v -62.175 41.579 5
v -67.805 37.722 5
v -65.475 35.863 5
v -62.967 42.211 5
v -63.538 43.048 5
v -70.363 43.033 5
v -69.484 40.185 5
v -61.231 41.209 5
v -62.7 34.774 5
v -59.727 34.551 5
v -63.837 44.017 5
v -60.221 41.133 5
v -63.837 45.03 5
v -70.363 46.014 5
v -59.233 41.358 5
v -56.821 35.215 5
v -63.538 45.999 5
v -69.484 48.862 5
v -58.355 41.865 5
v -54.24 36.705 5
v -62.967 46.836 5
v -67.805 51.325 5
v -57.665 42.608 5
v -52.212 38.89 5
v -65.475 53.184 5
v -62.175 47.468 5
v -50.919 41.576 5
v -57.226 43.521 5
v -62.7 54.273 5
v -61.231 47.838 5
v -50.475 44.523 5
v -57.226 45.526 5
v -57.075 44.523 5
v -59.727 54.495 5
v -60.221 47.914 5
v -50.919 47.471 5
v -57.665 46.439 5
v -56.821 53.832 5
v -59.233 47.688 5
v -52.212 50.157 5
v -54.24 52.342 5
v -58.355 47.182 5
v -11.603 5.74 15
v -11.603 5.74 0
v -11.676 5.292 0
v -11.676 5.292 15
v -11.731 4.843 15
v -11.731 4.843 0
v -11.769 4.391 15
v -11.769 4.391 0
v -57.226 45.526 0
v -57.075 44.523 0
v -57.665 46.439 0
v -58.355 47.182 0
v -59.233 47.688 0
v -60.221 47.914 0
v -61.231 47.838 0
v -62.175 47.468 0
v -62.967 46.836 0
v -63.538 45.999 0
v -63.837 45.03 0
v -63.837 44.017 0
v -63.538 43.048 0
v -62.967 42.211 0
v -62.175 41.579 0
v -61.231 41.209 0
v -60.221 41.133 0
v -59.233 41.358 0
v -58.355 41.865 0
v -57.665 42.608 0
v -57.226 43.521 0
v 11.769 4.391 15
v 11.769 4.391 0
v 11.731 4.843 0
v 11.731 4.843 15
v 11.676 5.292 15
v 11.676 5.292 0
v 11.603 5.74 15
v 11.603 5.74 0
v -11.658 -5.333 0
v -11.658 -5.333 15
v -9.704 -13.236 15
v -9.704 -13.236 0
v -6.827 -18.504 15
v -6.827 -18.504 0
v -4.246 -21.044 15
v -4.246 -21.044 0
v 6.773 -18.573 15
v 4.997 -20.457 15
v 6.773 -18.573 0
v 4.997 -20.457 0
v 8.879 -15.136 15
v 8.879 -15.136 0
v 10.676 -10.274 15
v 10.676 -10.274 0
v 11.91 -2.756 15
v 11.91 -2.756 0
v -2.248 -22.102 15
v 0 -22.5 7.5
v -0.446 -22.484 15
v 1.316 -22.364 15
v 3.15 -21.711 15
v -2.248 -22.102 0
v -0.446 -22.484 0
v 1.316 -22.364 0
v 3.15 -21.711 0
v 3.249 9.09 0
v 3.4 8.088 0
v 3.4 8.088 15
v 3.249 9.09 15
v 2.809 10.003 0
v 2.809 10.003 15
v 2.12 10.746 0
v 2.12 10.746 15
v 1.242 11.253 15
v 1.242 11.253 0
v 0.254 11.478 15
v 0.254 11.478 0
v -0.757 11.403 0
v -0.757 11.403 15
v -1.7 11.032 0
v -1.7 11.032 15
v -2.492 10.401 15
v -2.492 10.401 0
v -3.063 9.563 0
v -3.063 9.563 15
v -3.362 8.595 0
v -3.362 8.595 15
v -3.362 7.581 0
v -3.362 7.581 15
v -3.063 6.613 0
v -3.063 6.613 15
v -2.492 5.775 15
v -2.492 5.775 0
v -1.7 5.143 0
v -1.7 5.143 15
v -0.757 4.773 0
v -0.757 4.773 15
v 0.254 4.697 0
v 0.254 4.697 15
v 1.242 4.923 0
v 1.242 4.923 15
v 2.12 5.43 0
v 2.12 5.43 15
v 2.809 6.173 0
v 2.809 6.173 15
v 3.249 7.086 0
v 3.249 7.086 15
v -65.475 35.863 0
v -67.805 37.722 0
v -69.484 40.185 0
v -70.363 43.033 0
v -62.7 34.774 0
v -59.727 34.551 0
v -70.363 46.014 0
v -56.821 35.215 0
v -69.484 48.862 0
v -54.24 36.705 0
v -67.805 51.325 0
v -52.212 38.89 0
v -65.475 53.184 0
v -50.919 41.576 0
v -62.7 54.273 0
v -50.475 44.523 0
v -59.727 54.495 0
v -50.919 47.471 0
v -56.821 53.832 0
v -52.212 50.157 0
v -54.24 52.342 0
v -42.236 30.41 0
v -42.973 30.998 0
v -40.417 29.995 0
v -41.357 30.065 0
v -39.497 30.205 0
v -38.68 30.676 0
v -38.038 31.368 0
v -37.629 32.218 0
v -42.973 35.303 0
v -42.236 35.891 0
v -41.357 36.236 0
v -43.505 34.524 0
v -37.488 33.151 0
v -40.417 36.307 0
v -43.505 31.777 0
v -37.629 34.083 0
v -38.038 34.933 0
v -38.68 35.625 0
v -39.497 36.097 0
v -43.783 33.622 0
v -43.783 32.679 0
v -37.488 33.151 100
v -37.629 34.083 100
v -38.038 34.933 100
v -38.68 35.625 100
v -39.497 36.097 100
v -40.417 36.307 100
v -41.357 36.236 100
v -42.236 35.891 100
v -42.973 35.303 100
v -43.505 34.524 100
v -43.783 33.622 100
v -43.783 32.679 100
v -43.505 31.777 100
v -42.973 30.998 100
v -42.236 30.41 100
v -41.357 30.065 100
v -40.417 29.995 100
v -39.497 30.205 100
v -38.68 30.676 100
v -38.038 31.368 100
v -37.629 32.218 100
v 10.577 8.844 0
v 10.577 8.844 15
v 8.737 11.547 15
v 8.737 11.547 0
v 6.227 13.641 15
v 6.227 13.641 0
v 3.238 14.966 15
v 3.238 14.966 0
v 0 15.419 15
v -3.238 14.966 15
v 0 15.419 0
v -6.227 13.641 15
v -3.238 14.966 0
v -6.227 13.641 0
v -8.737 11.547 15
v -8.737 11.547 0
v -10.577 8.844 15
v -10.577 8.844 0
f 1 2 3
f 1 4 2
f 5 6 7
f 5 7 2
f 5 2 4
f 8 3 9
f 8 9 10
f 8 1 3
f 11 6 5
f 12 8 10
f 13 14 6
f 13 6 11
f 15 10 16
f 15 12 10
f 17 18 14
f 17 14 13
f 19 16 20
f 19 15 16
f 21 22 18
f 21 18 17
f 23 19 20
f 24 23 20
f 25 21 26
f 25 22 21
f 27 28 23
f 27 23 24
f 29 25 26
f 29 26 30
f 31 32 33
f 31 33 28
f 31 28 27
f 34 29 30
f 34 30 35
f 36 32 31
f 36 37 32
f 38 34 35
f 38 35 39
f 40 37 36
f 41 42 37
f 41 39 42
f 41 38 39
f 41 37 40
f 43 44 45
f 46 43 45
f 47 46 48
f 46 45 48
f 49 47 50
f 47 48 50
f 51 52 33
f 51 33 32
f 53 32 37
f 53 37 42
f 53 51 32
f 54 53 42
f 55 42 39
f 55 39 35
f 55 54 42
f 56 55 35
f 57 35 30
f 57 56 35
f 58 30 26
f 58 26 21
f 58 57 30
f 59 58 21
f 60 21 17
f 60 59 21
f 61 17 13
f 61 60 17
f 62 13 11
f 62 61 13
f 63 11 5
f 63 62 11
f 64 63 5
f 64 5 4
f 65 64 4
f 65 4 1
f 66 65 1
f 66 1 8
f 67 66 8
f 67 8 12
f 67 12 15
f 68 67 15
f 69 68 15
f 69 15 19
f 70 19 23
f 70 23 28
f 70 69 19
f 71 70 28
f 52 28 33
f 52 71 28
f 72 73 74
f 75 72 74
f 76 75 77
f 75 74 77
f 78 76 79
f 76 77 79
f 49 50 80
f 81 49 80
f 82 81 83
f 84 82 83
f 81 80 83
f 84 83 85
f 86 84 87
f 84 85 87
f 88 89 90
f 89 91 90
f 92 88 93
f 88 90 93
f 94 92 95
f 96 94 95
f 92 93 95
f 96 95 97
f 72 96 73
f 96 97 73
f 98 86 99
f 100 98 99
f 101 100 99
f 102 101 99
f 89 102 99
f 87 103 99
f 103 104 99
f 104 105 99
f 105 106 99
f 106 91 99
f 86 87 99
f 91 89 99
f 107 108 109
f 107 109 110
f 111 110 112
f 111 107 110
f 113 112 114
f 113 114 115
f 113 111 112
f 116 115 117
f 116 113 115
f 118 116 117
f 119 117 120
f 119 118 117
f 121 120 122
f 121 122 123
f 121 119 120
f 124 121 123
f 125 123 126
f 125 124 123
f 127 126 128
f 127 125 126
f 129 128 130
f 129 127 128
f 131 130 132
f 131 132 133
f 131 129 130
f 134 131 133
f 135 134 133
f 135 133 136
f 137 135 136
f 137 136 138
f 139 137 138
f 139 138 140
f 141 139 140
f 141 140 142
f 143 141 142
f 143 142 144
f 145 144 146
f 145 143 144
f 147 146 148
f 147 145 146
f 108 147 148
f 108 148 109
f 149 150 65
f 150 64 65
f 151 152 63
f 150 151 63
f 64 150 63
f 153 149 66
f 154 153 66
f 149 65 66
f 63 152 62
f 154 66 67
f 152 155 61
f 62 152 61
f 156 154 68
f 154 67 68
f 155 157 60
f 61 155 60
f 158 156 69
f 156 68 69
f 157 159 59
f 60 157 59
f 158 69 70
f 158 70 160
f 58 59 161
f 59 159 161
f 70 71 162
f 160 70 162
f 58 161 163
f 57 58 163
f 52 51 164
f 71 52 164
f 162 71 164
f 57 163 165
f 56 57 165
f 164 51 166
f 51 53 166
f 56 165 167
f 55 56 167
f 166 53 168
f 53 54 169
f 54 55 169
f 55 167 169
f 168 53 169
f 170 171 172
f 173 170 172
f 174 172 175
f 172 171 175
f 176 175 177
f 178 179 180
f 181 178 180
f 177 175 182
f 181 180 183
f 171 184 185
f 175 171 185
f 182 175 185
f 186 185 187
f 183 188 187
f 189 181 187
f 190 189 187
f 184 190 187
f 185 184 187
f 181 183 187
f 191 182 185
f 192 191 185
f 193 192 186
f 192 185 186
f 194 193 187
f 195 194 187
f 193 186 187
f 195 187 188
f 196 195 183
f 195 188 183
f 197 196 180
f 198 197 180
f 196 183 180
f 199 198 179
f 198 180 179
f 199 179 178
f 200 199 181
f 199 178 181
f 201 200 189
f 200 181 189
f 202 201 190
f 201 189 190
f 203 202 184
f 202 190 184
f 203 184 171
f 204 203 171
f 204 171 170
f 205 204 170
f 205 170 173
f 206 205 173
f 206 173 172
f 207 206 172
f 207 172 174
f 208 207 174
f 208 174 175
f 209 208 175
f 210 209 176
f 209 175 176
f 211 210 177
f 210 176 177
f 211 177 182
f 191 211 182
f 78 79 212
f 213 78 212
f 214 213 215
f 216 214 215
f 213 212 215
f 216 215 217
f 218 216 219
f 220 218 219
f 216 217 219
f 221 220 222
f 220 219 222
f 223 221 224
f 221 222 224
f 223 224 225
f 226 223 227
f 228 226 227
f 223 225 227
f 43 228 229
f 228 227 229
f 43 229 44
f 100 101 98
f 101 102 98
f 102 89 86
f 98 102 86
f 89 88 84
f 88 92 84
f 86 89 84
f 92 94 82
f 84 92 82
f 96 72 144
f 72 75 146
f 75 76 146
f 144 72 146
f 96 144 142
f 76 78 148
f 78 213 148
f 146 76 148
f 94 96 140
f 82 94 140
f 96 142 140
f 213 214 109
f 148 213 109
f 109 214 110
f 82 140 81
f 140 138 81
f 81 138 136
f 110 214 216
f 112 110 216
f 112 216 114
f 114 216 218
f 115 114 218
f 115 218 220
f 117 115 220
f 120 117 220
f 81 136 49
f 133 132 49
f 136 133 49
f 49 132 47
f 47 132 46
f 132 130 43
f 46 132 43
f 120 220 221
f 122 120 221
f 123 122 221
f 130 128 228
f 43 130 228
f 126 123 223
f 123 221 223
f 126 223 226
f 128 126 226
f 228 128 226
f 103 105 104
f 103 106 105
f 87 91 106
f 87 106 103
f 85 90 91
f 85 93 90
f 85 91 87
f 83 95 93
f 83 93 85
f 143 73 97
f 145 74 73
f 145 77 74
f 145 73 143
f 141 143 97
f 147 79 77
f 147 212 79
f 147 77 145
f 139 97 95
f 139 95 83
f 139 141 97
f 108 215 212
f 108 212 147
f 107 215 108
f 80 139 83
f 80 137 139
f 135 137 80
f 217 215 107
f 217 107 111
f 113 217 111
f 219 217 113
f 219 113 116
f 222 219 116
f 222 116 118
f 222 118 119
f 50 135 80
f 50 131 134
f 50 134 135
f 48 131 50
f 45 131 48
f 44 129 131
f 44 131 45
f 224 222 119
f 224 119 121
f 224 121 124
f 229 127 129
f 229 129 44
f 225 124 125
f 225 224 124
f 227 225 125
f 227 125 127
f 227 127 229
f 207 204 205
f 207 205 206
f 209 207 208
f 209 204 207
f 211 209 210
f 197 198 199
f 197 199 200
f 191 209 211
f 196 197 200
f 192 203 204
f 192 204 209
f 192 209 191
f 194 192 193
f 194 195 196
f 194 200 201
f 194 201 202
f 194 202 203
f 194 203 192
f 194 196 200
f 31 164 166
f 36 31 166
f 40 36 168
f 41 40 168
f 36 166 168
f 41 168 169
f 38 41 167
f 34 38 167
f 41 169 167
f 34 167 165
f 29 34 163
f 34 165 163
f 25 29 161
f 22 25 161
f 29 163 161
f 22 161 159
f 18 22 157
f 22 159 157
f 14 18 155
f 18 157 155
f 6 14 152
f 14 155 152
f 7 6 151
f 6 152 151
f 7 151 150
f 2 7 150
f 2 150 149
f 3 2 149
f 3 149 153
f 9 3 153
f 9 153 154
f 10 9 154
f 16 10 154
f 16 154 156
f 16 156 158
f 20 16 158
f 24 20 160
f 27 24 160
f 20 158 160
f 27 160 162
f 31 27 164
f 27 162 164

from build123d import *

# Parameters (mm, degrees)
F0_R     = 3.4
F1_DEPTH = 15
F2_R     = 10
F2_R_2   = 3.4
F3_DEPTH = 5
F4_R     = 3.1648062528
F5_DEPTH = 100


with BuildPart() as f1:
    # F0 (on Top) → F1 (new body)
    with BuildSketch(Plane.XY):
        with BuildLine():
            add(Edge.make_bspline(
                [(11.7692737968, 4.3909418779), (11.6971997454, 5.0701040007), (11.6029873176, 5.7396703336)],
                knots=[4.9088023994, 4.9088023994, 4.9088023994, 4.970336442, 4.970336442, 4.970336442], degree=2, weights=[1, 0.9995267325, 1]))
            ThreePointArc((11.7692737968, 4.3909418779), (11.7055719429, 5.0677030594), (11.6029873176, 5.7396703336))
        make_face()
        with BuildLine():
            add(Edge.make_bspline(
                [(-11.7692737968, 4.3909418779), (-14.6229946716, -22.5), (0, -22.5), (14.6229946716, -22.5), (11.7692737968, 4.3909418779)],
                knots=[1.3743829078, 1.3743829078, 1.3743829078, 3.1415926536, 3.1415926536, 4.9088023994, 4.9088023994, 4.9088023994], degree=2, weights=[1, 0.6343685946, 1, 0.6343685946, 1]))
            add(Edge.make_bspline(
                [(11.7692737968, 4.3909418779), (11.6971997454, 5.0701040007), (11.6029873176, 5.7396703336)],
                knots=[4.9088023994, 4.9088023994, 4.9088023994, 4.970336442, 4.970336442, 4.970336442], degree=2, weights=[1, 0.9995267325, 1]))
            ThreePointArc((11.6029873176, 5.7396703336), (0, 15.4187110222), (-11.6029873176, 5.7396703336))
            add(Edge.make_bspline(
                [(-11.6029873176, 5.7396703336), (-11.6971997454, 5.0701040007), (-11.7692737968, 4.3909418779)],
                knots=[1.3128488651, 1.3128488651, 1.3128488651, 1.3743829078, 1.3743829078, 1.3743829078], degree=2, weights=[1, 0.9995267325, 1]))
        make_face()
        with Locations((0, 8.0879377201)):
            Circle(F0_R, mode=Mode.SUBTRACT)
        with BuildLine():
            ThreePointArc((-11.6029873176, 5.7396703336), (-11.7055719429, 5.0677030594), (-11.7692737968, 4.3909418779))
            add(Edge.make_bspline(
                [(-11.6029873176, 5.7396703336), (-11.6971997454, 5.0701040007), (-11.7692737968, 4.3909418779)],
                knots=[1.3128488651, 1.3128488651, 1.3128488651, 1.3743829078, 1.3743829078, 1.3743829078], degree=2, weights=[1, 0.9995267325, 1]))
        make_face()
    extrude(amount=F1_DEPTH)


with BuildPart() as f3:
    # F2 (on Top) → F3 (new body)
    with BuildSketch(Plane.XY):
        with Locations((-60.4746863246, 44.5234291255)):
            Circle(F2_R)
        with Locations((-60.4746863246, 44.5234291255)):
            Circle(F2_R_2, mode=Mode.SUBTRACT)
    extrude(amount=F3_DEPTH)


with BuildPart() as f5:
    # F4 (on Top) → F5 (new body)
    with BuildSketch(Plane.XY):
        with Locations((-40.6531989574, 33.1506431103)):
            Circle(F4_R)
    extrude(amount=F5_DEPTH)


solid = Compound([f1.part, f3.part, f5.part])
